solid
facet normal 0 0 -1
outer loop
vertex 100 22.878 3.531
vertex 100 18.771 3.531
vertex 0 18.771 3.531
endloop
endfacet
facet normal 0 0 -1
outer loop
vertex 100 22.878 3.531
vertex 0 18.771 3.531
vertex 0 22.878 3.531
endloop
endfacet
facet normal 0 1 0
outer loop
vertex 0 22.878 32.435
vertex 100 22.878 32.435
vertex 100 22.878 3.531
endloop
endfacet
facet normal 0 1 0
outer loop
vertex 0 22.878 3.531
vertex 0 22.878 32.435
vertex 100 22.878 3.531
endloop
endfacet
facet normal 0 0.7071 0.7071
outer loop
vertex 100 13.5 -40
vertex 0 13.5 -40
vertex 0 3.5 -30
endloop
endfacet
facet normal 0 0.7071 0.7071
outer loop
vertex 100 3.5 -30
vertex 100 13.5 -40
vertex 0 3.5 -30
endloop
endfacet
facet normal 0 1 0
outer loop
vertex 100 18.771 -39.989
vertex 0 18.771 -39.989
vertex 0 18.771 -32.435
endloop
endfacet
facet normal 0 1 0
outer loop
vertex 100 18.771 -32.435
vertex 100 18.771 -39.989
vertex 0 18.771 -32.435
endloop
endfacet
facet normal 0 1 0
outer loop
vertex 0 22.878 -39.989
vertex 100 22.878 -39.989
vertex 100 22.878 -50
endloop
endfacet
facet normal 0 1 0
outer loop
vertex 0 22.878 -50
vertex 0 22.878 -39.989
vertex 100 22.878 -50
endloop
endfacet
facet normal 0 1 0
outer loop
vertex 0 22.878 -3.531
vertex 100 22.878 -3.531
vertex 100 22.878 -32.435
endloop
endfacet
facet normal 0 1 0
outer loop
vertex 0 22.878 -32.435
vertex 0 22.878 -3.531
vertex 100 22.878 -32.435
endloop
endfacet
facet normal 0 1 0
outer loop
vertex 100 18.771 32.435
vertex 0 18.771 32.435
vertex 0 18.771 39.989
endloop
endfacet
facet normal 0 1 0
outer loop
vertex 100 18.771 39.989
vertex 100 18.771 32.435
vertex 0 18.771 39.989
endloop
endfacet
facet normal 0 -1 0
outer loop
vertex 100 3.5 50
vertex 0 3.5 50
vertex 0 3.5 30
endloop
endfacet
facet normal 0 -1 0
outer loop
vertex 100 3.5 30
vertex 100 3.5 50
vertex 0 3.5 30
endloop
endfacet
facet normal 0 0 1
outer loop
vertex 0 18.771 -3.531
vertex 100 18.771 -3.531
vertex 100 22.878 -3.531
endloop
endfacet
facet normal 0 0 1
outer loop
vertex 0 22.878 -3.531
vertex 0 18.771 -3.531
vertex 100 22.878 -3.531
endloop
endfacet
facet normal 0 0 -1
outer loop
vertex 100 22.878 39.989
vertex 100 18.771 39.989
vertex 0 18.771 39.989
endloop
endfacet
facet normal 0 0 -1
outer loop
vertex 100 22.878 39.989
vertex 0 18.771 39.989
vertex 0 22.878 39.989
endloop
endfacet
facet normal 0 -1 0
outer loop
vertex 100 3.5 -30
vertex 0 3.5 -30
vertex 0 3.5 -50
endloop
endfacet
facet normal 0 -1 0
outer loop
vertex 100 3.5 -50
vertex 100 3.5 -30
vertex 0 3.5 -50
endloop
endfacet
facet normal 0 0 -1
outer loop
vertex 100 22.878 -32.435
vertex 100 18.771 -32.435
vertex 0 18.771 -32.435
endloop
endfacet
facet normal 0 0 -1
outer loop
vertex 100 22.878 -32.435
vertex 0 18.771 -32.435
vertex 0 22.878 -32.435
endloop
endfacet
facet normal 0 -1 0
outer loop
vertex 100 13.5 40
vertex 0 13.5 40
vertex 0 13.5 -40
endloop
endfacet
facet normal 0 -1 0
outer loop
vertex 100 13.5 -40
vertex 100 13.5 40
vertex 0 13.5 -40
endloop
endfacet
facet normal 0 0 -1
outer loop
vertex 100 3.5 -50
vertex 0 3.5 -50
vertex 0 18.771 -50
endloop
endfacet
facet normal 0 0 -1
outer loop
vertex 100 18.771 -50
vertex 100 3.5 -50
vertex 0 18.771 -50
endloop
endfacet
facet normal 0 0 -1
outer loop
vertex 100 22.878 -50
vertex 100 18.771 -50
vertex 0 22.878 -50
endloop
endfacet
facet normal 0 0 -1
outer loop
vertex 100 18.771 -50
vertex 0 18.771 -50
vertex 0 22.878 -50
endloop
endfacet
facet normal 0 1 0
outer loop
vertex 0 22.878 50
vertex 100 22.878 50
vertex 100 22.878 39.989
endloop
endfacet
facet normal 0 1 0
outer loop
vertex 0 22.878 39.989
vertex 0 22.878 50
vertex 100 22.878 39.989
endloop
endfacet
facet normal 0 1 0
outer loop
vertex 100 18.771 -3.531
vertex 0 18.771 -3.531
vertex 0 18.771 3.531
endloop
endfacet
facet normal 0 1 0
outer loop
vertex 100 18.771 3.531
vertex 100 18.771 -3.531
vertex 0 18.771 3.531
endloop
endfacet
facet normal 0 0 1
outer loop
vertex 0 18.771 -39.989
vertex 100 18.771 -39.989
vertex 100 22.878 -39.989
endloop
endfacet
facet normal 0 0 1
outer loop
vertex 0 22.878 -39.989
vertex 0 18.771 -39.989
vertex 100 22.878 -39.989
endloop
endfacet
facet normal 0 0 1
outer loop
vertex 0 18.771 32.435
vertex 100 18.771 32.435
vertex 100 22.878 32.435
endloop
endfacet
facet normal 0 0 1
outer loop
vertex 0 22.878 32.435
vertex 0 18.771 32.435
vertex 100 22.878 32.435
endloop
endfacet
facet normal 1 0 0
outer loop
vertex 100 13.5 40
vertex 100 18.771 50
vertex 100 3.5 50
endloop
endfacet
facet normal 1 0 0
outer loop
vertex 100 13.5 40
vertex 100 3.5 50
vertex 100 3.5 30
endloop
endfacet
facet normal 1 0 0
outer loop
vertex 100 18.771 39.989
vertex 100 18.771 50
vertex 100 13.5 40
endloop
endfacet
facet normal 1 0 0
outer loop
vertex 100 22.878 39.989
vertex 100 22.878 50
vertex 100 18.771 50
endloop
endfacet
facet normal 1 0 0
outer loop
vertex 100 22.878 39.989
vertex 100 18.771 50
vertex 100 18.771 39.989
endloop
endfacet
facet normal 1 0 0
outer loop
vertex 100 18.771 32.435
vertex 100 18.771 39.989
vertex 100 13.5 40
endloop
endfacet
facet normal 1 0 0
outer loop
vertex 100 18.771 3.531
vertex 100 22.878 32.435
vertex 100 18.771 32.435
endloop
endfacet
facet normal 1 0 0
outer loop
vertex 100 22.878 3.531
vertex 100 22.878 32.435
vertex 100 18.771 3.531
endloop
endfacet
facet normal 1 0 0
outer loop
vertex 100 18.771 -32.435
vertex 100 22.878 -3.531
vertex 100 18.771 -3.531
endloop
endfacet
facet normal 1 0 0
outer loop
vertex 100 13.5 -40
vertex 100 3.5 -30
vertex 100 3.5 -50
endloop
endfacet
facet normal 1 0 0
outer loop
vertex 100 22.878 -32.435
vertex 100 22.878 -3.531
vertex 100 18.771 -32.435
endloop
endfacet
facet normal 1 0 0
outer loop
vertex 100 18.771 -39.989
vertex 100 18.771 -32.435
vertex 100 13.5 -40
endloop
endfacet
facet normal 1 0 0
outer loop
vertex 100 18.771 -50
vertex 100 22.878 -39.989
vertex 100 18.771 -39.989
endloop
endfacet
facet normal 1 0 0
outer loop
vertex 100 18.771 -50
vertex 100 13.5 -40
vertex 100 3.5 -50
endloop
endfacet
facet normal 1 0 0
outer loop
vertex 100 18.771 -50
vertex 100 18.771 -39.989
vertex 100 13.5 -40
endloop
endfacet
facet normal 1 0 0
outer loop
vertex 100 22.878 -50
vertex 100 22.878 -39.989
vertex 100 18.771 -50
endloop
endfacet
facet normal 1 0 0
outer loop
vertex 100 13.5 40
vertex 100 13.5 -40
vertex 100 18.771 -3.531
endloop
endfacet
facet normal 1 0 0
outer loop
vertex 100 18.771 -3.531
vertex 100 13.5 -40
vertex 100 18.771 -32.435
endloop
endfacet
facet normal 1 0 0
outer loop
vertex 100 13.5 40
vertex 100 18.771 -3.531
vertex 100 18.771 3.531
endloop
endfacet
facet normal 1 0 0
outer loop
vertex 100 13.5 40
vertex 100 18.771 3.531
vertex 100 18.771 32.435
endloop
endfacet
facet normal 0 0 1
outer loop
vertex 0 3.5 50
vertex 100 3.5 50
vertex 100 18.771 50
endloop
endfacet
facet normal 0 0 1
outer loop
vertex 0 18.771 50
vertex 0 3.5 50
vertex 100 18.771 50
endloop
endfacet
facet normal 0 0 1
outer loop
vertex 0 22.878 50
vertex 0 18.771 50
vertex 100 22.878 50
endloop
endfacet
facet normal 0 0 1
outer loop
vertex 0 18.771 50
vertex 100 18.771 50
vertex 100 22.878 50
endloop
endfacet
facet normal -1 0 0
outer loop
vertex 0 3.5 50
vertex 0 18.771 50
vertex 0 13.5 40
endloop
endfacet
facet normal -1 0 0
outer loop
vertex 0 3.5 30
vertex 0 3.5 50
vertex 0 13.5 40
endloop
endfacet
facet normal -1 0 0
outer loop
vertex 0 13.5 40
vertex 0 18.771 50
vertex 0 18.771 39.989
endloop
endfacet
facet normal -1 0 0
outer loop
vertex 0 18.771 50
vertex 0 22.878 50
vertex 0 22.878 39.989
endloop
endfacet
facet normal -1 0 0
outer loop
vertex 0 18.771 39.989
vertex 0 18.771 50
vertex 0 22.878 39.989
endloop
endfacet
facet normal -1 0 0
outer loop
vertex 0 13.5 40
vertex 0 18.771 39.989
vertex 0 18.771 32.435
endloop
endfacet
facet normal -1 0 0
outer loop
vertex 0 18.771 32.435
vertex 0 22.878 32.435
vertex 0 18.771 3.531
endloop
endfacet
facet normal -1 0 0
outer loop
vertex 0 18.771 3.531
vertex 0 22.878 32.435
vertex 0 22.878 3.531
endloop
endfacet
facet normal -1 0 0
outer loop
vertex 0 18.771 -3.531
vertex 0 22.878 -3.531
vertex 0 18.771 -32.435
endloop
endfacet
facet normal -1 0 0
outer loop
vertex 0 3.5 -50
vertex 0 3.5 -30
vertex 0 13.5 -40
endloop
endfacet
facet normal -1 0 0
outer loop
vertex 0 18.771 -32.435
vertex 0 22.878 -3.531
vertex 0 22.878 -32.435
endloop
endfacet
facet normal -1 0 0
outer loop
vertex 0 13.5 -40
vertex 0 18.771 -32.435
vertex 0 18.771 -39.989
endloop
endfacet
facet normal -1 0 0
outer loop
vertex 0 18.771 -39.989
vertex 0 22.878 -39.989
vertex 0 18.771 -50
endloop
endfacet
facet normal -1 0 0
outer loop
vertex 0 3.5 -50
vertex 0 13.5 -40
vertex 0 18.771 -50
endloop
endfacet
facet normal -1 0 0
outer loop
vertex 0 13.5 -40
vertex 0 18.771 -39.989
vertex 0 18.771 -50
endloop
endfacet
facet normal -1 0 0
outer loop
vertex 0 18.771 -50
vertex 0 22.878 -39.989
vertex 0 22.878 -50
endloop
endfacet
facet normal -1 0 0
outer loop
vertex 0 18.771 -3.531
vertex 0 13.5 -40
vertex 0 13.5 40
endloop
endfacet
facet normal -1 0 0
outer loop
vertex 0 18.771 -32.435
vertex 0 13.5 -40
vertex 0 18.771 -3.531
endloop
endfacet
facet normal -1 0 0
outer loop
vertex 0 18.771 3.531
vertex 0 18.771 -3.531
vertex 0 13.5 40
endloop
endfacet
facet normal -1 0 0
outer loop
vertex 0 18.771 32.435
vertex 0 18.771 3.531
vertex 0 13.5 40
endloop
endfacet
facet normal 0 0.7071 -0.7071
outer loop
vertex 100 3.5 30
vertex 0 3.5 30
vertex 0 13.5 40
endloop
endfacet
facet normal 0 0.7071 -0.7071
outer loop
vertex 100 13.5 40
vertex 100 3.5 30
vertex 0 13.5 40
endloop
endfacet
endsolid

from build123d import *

# Parameters (mm, degrees)
SALIENTE_EXTRUIR1_DEPTH = 100
CROQUIS2_W              = 10.010901807
CROQUIS2_H              = 4.106706179
CROQUIS2_W_2            = 28.903824567
SALIENTE_EXTRUIR2_DEPTH = 100


with BuildPart() as part:
    # Croquis1 → Saliente-Extruir1 (new body)
    with BuildSketch(Plane(origin=(0, 0, 0), x_dir=(0, 0, -1), z_dir=(1, 0, 0))):
        Polygon((-30, 3.5), (-40, 13.5), (40, 13.5), (30, 3.5), (50, 3.5), (50, 18.770945102), (-50, 18.770945102), (-50, 3.5), align=None)
    extrude(amount=SALIENTE_EXTRUIR1_DEPTH)

    # Croquis2 → Saliente-Extruir2 (add)
    with BuildSketch(Plane(origin=(100, 0, 0), x_dir=(0, 0, -1), z_dir=(1, 0, 0))):
        with Locations((-44.994549097, 20.824298192)):
            Rectangle(CROQUIS2_W, CROQUIS2_H)
        with Locations((-17.982777217, 20.824298192)):
            Rectangle(CROQUIS2_W_2, CROQUIS2_H)
        with Locations((17.982777217, 20.824298192)):
            Rectangle(CROQUIS2_W_2, CROQUIS2_H)
        with Locations((44.994549097, 20.824298192)):
            Rectangle(CROQUIS2_W, CROQUIS2_H)
    extrude(amount=-SALIENTE_EXTRUIR2_DEPTH)


solid = part.part
